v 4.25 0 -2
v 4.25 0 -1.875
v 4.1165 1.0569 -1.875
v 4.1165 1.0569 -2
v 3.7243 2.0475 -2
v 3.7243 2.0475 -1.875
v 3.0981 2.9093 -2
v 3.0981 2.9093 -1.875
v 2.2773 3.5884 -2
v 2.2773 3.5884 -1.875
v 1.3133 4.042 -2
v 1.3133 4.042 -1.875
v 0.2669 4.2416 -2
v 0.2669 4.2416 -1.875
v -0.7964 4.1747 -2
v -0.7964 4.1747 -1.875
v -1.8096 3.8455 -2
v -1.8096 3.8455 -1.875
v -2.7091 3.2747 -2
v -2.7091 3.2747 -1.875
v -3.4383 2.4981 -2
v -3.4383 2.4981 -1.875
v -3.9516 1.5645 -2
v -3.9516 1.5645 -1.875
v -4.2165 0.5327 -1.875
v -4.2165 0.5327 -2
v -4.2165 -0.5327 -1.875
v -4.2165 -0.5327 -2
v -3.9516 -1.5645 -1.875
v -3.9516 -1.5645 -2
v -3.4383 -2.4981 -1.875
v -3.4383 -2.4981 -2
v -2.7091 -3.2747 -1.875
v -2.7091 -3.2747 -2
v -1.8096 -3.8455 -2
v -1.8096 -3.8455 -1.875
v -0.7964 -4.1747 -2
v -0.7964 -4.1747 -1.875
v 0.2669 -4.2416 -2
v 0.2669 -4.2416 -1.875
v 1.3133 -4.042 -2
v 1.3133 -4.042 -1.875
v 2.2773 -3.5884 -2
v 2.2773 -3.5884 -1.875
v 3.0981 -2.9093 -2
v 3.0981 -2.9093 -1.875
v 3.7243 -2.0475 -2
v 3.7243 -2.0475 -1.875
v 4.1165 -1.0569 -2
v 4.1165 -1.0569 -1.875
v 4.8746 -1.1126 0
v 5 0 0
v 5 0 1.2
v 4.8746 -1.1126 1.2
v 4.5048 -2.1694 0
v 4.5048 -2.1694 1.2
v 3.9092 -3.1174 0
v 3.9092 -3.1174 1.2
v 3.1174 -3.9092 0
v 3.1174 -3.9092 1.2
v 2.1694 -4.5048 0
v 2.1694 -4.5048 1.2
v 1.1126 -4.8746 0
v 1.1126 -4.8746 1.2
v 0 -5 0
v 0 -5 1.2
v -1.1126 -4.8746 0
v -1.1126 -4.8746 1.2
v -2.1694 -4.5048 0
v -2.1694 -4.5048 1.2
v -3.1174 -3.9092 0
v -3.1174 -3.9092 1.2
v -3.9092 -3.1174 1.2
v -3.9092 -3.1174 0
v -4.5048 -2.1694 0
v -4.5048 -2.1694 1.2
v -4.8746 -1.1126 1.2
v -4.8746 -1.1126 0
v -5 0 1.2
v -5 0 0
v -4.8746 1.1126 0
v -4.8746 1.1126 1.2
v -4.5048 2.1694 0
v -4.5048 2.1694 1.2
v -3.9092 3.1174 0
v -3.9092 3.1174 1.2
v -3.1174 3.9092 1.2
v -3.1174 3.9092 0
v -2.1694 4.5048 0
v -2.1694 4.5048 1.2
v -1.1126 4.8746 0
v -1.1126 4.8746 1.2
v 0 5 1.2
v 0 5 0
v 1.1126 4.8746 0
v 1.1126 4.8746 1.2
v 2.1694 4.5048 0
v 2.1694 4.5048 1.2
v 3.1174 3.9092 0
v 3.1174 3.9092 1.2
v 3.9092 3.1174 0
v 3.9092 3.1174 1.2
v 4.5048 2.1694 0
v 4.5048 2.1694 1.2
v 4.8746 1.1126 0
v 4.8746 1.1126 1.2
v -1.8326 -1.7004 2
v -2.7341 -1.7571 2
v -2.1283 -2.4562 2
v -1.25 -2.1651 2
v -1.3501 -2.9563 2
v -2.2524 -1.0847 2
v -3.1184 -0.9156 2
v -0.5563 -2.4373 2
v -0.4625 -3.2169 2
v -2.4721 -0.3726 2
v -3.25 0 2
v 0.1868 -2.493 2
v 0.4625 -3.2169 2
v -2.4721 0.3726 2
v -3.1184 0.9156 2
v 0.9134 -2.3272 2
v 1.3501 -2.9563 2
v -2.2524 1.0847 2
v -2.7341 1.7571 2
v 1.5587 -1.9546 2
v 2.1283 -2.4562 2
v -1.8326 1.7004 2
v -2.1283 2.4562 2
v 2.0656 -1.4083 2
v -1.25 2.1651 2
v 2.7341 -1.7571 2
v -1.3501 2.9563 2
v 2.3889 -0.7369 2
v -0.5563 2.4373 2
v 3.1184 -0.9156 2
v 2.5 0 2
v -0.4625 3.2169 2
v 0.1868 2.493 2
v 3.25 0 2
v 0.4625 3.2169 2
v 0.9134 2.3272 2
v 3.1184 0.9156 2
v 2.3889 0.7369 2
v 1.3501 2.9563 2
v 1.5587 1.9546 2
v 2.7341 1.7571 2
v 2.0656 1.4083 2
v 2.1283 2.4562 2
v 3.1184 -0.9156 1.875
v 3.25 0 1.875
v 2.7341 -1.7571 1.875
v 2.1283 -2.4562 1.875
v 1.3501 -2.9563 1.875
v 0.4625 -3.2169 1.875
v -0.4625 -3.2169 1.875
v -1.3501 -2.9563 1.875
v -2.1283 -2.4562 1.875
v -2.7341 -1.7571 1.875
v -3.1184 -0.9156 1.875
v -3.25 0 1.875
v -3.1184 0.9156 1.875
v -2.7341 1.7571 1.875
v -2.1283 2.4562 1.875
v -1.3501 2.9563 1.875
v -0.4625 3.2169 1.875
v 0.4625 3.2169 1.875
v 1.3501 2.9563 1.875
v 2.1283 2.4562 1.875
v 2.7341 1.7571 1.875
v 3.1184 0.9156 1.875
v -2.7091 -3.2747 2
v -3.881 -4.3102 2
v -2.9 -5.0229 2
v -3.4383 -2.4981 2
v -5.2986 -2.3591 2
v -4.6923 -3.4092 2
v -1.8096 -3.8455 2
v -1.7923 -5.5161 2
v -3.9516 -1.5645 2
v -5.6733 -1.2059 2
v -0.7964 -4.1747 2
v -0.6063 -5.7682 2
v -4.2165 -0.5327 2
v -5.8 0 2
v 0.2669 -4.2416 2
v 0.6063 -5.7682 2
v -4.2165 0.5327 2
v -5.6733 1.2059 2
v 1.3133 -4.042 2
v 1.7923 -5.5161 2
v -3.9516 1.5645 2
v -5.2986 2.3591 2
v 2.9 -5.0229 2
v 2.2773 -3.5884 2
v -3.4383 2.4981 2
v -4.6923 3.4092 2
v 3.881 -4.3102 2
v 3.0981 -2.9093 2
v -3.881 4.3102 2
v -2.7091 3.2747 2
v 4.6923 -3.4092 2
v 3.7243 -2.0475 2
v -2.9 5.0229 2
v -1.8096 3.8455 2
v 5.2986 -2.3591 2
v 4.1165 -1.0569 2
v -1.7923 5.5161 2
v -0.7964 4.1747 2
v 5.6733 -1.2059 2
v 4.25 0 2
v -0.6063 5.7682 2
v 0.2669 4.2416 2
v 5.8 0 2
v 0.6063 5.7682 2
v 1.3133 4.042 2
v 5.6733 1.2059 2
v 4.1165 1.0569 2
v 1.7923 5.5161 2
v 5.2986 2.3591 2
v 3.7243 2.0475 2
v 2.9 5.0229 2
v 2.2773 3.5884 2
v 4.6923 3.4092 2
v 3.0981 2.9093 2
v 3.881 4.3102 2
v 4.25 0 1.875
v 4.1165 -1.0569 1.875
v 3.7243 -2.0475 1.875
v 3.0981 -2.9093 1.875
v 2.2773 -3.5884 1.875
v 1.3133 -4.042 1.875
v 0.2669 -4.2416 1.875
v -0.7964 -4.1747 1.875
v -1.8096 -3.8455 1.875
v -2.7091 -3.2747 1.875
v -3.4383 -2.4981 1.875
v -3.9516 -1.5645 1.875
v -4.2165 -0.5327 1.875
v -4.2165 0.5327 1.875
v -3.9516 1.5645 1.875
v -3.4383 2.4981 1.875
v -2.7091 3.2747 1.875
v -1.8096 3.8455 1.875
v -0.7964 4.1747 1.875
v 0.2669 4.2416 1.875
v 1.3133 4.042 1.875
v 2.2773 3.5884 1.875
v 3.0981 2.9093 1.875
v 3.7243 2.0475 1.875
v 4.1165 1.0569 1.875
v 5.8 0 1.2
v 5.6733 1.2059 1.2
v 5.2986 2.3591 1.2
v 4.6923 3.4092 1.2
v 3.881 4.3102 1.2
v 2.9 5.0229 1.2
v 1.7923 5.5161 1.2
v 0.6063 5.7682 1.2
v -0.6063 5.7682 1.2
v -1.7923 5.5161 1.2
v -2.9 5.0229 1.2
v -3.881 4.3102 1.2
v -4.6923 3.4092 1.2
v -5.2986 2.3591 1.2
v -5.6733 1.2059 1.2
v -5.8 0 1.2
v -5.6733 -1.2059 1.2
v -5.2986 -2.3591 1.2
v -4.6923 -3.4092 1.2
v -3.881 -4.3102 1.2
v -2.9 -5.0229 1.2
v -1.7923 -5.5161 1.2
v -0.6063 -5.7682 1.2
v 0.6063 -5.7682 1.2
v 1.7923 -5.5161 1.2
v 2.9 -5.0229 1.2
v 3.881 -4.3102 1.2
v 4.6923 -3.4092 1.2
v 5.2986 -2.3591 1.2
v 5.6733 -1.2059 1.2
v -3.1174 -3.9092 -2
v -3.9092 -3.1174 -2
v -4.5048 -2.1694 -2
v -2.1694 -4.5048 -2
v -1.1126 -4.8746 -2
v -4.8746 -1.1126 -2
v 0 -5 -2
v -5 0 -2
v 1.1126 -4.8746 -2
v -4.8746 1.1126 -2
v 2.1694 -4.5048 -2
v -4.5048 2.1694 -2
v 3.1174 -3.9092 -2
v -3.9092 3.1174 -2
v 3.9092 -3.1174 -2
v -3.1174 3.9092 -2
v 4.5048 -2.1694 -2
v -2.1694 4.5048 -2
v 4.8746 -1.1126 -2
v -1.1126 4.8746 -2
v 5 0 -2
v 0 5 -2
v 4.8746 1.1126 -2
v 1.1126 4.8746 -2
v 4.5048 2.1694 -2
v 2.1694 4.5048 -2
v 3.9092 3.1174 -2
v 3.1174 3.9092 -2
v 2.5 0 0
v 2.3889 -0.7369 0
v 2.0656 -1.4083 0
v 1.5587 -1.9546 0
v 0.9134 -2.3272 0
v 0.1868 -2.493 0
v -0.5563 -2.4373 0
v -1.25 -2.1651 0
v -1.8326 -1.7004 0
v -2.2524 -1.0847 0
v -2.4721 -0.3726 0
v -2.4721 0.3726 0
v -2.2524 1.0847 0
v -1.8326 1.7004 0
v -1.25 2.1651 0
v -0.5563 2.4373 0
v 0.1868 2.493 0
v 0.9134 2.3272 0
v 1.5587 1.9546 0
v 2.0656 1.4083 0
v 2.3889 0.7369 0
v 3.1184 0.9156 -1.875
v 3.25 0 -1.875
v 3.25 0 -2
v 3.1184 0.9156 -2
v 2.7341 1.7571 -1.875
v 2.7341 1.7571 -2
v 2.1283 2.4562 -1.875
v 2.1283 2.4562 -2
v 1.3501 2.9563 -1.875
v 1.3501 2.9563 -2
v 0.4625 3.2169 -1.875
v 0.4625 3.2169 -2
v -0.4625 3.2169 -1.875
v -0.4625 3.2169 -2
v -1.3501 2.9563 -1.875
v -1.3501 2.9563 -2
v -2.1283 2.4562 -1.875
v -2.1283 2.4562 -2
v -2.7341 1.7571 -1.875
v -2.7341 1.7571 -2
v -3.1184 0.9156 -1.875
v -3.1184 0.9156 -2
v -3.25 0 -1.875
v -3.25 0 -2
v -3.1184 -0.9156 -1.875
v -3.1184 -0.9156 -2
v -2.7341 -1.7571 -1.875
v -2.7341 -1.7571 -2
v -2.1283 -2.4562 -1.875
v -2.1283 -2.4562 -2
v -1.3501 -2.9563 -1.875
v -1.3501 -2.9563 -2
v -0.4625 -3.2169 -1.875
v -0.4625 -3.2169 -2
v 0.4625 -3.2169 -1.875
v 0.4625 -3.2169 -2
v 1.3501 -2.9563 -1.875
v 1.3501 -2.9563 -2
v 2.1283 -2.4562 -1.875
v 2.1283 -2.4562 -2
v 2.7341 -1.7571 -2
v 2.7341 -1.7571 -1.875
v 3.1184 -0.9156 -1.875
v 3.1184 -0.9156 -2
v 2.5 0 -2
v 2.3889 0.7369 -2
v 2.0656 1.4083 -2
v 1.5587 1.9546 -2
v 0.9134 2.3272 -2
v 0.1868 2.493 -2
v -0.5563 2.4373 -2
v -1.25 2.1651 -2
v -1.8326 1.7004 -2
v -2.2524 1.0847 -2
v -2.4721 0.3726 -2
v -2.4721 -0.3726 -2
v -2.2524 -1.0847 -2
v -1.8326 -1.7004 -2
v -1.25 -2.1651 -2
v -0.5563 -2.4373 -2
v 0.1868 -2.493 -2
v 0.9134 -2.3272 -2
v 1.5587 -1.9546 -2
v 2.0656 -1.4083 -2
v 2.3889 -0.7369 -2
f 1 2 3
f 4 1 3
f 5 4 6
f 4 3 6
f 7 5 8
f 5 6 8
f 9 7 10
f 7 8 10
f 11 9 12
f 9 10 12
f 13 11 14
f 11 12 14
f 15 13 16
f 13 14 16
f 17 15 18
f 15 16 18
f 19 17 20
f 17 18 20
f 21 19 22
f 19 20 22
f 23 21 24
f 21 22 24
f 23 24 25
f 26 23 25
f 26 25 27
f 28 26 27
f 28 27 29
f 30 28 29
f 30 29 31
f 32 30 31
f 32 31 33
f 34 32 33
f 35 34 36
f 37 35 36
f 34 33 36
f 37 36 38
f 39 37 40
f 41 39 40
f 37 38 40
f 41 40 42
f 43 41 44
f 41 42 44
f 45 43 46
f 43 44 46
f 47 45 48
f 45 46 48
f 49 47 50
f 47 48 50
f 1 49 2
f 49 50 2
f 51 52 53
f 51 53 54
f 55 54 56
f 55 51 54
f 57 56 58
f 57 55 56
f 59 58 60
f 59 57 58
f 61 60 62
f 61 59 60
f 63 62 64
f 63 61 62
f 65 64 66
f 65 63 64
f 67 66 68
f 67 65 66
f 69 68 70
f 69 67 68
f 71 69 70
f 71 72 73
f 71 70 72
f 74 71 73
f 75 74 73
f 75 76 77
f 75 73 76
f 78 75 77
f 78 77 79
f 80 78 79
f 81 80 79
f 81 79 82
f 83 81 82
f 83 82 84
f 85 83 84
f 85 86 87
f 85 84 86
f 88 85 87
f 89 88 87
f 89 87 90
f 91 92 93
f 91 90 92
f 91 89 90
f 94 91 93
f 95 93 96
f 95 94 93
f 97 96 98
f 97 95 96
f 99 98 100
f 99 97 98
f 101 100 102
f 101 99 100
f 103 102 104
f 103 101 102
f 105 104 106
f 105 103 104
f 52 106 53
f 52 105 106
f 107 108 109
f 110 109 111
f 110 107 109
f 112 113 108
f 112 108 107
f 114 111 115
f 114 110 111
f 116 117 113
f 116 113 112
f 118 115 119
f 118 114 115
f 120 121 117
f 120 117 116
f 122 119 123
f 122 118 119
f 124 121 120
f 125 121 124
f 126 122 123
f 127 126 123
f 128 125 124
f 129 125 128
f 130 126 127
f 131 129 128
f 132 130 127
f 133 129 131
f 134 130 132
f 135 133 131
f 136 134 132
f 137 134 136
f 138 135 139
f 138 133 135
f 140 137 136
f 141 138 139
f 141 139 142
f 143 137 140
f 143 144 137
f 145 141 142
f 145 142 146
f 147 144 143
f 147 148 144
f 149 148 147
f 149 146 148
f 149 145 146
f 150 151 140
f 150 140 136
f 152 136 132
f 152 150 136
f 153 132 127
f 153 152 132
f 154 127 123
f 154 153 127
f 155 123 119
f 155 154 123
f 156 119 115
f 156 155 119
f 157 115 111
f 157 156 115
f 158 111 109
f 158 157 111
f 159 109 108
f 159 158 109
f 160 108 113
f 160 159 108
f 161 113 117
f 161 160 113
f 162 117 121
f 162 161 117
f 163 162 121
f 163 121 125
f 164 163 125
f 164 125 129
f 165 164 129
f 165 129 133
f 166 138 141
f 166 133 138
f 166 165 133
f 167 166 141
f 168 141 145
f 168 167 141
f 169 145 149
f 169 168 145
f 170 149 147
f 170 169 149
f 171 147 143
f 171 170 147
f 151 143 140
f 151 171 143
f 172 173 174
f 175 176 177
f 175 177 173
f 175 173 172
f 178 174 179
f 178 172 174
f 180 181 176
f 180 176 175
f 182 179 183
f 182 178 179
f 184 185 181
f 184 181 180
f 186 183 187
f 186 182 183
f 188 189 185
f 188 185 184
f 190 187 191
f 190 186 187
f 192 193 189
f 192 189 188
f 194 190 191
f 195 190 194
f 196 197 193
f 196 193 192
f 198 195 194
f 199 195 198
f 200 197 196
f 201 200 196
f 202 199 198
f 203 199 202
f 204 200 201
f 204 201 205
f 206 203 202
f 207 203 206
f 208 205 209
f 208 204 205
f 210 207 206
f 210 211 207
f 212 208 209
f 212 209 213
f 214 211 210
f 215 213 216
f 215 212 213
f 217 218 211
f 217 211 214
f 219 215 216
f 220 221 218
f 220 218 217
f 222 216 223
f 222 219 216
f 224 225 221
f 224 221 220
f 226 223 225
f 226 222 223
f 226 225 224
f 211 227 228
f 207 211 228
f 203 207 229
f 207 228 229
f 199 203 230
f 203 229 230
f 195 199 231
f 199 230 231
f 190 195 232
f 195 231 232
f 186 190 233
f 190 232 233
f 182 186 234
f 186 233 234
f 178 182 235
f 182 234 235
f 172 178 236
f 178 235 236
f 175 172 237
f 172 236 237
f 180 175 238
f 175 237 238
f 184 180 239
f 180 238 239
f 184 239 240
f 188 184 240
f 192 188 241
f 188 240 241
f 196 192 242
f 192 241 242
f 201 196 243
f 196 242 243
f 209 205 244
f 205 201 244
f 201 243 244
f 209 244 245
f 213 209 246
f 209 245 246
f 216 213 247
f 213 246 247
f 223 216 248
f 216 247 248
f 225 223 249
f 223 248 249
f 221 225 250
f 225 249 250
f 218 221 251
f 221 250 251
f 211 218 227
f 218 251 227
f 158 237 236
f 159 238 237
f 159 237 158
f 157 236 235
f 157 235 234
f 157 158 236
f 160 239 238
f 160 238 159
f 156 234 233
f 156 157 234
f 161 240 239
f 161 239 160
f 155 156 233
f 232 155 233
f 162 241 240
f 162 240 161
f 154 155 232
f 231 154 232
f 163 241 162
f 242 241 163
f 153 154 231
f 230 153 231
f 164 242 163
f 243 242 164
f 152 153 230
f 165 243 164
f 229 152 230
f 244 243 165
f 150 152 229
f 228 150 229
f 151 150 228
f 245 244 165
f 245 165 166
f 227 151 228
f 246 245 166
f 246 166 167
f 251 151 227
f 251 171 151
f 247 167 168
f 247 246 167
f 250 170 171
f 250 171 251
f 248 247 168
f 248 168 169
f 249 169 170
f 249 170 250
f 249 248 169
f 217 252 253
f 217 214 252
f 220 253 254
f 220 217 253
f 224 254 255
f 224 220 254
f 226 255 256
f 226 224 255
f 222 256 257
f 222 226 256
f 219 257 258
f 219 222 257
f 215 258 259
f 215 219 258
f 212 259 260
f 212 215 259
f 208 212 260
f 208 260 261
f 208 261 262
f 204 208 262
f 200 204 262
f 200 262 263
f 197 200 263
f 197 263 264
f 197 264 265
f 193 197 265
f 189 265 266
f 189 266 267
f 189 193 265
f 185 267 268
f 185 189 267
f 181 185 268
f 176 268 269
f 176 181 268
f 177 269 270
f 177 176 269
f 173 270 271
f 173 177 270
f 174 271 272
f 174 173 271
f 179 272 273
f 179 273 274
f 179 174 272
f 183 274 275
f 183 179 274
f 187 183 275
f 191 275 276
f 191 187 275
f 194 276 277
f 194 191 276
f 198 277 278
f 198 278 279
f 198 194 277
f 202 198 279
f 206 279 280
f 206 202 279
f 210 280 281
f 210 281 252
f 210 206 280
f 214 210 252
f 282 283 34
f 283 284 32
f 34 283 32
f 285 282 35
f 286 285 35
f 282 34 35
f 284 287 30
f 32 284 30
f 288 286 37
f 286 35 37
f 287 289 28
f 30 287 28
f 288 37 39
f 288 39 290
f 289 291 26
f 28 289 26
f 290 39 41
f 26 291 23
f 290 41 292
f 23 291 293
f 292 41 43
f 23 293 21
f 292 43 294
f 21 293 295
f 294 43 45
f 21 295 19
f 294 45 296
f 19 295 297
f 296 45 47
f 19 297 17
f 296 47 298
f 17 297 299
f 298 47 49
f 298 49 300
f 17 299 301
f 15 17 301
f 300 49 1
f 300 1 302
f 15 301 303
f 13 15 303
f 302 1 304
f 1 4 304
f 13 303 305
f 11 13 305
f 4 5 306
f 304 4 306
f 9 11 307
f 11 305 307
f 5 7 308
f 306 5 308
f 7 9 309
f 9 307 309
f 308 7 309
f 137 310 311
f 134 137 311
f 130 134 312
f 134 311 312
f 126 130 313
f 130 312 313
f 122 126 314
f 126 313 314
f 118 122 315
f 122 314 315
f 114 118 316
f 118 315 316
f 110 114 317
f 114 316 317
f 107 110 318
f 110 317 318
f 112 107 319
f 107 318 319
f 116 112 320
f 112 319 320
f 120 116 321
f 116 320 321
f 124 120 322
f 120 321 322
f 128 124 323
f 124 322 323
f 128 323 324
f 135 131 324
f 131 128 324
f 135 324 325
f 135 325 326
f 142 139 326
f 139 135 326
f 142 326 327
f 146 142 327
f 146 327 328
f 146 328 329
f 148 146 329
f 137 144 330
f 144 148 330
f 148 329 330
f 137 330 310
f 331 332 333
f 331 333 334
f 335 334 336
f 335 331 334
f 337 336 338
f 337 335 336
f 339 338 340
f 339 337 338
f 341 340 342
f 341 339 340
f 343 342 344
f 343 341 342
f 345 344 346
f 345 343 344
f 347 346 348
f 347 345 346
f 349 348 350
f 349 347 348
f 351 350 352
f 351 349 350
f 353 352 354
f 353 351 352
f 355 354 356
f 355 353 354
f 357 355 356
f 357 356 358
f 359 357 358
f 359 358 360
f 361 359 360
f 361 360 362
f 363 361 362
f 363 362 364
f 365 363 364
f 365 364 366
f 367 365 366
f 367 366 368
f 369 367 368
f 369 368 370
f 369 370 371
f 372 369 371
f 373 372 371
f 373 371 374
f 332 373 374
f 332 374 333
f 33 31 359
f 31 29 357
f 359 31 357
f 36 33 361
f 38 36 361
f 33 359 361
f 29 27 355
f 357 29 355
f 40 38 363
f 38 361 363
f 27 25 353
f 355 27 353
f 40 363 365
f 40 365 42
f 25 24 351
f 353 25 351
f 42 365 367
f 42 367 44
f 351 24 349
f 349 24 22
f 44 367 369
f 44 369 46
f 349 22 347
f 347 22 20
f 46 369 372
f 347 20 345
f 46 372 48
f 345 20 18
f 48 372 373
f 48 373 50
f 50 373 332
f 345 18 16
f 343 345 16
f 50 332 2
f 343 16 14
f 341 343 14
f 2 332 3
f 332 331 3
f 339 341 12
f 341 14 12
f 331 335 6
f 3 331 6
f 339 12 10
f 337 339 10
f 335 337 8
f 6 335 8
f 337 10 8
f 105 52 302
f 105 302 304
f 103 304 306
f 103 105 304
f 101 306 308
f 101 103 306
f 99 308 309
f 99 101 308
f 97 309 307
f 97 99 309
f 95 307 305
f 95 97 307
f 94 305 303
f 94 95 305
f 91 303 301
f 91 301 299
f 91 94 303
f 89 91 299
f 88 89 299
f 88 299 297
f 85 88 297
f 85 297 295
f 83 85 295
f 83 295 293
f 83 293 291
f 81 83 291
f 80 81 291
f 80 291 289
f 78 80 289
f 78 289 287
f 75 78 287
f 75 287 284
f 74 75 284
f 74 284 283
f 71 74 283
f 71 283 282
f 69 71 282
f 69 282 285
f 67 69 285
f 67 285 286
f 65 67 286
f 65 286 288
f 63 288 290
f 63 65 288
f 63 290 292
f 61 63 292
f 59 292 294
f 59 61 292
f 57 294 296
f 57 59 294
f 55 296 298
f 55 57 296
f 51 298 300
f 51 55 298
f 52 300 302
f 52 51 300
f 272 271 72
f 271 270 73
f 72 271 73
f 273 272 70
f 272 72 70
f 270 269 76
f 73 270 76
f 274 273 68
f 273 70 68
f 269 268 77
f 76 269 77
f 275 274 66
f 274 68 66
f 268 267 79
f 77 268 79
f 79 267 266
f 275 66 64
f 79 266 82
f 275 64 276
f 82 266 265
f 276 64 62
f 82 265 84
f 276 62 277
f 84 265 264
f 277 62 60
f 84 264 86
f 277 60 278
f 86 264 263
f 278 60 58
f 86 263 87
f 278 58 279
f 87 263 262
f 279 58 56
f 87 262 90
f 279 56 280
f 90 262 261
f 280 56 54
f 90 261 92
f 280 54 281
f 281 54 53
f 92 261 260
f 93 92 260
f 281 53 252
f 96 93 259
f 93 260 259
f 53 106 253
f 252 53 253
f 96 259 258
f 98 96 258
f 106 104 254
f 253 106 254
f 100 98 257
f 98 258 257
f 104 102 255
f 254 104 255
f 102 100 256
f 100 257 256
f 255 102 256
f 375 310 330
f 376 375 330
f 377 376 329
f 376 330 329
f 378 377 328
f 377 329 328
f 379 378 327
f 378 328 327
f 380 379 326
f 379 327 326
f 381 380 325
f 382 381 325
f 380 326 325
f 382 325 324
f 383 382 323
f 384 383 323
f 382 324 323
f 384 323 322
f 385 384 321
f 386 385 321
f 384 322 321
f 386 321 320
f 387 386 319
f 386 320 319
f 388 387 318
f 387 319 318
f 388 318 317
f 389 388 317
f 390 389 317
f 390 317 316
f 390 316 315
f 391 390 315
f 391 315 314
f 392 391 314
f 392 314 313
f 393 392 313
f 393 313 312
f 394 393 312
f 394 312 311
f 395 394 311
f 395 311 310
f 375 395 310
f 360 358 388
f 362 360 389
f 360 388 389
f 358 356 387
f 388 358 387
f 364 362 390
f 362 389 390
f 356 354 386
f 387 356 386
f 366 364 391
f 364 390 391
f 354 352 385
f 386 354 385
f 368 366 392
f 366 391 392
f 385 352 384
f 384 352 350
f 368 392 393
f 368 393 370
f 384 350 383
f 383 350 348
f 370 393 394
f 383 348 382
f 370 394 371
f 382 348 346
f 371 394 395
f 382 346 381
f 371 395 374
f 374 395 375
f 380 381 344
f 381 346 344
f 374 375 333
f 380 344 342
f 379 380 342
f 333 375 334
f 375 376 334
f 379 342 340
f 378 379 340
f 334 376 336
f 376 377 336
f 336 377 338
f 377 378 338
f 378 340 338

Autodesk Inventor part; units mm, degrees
ref_plane "YZ Plane" through (0, 0, 0) normal (1, 0, 0) x (0, 1, 0)
ref_plane "XZ Plane" through (0, 0, 0) normal (0, 1, 0) x (-1, 0, 0)
ref_plane "XY Plane" through (0, 0, 0) normal (0, 0, 1) x (1, 0, 0)
sketch "Sketch1" plane through (0, 0, 0) normal (0, 0, 1) x (1, 0, 0)
  circle A0 centre (0, 0) radius 2.5
  circle A1 centre (0, 0) radius 5
  circle A2 centre (0, 0) radius 4.25
  circle A3 centre (0, 0) radius 3.25
  dimension "d0" = 5
  dimension "d1" = 10
  dimension "d2" = 0.75
  dimension "d3" = 0.75
extrude "Extrusion1" add sketch "Sketch1" along normal mid plane 4
extrude "Extrusion2" add sketch "Sketch1" along normal mid plane 3.75 contours A2
sketch "Sketch2" plane through (0, 0, 2) normal (0, 0, 1) x (1, 0, 0)
  circle A0 centre (0, 0) radius 5 projected
  circle A1 centre (0, 0) radius 5.8
  dimension "d8" = 11.6
extrude "Extrusion3" add sketch "Sketch2" against normal blind 0.8
properties part number "MF105ZZ" material "Steel, Carbon"
